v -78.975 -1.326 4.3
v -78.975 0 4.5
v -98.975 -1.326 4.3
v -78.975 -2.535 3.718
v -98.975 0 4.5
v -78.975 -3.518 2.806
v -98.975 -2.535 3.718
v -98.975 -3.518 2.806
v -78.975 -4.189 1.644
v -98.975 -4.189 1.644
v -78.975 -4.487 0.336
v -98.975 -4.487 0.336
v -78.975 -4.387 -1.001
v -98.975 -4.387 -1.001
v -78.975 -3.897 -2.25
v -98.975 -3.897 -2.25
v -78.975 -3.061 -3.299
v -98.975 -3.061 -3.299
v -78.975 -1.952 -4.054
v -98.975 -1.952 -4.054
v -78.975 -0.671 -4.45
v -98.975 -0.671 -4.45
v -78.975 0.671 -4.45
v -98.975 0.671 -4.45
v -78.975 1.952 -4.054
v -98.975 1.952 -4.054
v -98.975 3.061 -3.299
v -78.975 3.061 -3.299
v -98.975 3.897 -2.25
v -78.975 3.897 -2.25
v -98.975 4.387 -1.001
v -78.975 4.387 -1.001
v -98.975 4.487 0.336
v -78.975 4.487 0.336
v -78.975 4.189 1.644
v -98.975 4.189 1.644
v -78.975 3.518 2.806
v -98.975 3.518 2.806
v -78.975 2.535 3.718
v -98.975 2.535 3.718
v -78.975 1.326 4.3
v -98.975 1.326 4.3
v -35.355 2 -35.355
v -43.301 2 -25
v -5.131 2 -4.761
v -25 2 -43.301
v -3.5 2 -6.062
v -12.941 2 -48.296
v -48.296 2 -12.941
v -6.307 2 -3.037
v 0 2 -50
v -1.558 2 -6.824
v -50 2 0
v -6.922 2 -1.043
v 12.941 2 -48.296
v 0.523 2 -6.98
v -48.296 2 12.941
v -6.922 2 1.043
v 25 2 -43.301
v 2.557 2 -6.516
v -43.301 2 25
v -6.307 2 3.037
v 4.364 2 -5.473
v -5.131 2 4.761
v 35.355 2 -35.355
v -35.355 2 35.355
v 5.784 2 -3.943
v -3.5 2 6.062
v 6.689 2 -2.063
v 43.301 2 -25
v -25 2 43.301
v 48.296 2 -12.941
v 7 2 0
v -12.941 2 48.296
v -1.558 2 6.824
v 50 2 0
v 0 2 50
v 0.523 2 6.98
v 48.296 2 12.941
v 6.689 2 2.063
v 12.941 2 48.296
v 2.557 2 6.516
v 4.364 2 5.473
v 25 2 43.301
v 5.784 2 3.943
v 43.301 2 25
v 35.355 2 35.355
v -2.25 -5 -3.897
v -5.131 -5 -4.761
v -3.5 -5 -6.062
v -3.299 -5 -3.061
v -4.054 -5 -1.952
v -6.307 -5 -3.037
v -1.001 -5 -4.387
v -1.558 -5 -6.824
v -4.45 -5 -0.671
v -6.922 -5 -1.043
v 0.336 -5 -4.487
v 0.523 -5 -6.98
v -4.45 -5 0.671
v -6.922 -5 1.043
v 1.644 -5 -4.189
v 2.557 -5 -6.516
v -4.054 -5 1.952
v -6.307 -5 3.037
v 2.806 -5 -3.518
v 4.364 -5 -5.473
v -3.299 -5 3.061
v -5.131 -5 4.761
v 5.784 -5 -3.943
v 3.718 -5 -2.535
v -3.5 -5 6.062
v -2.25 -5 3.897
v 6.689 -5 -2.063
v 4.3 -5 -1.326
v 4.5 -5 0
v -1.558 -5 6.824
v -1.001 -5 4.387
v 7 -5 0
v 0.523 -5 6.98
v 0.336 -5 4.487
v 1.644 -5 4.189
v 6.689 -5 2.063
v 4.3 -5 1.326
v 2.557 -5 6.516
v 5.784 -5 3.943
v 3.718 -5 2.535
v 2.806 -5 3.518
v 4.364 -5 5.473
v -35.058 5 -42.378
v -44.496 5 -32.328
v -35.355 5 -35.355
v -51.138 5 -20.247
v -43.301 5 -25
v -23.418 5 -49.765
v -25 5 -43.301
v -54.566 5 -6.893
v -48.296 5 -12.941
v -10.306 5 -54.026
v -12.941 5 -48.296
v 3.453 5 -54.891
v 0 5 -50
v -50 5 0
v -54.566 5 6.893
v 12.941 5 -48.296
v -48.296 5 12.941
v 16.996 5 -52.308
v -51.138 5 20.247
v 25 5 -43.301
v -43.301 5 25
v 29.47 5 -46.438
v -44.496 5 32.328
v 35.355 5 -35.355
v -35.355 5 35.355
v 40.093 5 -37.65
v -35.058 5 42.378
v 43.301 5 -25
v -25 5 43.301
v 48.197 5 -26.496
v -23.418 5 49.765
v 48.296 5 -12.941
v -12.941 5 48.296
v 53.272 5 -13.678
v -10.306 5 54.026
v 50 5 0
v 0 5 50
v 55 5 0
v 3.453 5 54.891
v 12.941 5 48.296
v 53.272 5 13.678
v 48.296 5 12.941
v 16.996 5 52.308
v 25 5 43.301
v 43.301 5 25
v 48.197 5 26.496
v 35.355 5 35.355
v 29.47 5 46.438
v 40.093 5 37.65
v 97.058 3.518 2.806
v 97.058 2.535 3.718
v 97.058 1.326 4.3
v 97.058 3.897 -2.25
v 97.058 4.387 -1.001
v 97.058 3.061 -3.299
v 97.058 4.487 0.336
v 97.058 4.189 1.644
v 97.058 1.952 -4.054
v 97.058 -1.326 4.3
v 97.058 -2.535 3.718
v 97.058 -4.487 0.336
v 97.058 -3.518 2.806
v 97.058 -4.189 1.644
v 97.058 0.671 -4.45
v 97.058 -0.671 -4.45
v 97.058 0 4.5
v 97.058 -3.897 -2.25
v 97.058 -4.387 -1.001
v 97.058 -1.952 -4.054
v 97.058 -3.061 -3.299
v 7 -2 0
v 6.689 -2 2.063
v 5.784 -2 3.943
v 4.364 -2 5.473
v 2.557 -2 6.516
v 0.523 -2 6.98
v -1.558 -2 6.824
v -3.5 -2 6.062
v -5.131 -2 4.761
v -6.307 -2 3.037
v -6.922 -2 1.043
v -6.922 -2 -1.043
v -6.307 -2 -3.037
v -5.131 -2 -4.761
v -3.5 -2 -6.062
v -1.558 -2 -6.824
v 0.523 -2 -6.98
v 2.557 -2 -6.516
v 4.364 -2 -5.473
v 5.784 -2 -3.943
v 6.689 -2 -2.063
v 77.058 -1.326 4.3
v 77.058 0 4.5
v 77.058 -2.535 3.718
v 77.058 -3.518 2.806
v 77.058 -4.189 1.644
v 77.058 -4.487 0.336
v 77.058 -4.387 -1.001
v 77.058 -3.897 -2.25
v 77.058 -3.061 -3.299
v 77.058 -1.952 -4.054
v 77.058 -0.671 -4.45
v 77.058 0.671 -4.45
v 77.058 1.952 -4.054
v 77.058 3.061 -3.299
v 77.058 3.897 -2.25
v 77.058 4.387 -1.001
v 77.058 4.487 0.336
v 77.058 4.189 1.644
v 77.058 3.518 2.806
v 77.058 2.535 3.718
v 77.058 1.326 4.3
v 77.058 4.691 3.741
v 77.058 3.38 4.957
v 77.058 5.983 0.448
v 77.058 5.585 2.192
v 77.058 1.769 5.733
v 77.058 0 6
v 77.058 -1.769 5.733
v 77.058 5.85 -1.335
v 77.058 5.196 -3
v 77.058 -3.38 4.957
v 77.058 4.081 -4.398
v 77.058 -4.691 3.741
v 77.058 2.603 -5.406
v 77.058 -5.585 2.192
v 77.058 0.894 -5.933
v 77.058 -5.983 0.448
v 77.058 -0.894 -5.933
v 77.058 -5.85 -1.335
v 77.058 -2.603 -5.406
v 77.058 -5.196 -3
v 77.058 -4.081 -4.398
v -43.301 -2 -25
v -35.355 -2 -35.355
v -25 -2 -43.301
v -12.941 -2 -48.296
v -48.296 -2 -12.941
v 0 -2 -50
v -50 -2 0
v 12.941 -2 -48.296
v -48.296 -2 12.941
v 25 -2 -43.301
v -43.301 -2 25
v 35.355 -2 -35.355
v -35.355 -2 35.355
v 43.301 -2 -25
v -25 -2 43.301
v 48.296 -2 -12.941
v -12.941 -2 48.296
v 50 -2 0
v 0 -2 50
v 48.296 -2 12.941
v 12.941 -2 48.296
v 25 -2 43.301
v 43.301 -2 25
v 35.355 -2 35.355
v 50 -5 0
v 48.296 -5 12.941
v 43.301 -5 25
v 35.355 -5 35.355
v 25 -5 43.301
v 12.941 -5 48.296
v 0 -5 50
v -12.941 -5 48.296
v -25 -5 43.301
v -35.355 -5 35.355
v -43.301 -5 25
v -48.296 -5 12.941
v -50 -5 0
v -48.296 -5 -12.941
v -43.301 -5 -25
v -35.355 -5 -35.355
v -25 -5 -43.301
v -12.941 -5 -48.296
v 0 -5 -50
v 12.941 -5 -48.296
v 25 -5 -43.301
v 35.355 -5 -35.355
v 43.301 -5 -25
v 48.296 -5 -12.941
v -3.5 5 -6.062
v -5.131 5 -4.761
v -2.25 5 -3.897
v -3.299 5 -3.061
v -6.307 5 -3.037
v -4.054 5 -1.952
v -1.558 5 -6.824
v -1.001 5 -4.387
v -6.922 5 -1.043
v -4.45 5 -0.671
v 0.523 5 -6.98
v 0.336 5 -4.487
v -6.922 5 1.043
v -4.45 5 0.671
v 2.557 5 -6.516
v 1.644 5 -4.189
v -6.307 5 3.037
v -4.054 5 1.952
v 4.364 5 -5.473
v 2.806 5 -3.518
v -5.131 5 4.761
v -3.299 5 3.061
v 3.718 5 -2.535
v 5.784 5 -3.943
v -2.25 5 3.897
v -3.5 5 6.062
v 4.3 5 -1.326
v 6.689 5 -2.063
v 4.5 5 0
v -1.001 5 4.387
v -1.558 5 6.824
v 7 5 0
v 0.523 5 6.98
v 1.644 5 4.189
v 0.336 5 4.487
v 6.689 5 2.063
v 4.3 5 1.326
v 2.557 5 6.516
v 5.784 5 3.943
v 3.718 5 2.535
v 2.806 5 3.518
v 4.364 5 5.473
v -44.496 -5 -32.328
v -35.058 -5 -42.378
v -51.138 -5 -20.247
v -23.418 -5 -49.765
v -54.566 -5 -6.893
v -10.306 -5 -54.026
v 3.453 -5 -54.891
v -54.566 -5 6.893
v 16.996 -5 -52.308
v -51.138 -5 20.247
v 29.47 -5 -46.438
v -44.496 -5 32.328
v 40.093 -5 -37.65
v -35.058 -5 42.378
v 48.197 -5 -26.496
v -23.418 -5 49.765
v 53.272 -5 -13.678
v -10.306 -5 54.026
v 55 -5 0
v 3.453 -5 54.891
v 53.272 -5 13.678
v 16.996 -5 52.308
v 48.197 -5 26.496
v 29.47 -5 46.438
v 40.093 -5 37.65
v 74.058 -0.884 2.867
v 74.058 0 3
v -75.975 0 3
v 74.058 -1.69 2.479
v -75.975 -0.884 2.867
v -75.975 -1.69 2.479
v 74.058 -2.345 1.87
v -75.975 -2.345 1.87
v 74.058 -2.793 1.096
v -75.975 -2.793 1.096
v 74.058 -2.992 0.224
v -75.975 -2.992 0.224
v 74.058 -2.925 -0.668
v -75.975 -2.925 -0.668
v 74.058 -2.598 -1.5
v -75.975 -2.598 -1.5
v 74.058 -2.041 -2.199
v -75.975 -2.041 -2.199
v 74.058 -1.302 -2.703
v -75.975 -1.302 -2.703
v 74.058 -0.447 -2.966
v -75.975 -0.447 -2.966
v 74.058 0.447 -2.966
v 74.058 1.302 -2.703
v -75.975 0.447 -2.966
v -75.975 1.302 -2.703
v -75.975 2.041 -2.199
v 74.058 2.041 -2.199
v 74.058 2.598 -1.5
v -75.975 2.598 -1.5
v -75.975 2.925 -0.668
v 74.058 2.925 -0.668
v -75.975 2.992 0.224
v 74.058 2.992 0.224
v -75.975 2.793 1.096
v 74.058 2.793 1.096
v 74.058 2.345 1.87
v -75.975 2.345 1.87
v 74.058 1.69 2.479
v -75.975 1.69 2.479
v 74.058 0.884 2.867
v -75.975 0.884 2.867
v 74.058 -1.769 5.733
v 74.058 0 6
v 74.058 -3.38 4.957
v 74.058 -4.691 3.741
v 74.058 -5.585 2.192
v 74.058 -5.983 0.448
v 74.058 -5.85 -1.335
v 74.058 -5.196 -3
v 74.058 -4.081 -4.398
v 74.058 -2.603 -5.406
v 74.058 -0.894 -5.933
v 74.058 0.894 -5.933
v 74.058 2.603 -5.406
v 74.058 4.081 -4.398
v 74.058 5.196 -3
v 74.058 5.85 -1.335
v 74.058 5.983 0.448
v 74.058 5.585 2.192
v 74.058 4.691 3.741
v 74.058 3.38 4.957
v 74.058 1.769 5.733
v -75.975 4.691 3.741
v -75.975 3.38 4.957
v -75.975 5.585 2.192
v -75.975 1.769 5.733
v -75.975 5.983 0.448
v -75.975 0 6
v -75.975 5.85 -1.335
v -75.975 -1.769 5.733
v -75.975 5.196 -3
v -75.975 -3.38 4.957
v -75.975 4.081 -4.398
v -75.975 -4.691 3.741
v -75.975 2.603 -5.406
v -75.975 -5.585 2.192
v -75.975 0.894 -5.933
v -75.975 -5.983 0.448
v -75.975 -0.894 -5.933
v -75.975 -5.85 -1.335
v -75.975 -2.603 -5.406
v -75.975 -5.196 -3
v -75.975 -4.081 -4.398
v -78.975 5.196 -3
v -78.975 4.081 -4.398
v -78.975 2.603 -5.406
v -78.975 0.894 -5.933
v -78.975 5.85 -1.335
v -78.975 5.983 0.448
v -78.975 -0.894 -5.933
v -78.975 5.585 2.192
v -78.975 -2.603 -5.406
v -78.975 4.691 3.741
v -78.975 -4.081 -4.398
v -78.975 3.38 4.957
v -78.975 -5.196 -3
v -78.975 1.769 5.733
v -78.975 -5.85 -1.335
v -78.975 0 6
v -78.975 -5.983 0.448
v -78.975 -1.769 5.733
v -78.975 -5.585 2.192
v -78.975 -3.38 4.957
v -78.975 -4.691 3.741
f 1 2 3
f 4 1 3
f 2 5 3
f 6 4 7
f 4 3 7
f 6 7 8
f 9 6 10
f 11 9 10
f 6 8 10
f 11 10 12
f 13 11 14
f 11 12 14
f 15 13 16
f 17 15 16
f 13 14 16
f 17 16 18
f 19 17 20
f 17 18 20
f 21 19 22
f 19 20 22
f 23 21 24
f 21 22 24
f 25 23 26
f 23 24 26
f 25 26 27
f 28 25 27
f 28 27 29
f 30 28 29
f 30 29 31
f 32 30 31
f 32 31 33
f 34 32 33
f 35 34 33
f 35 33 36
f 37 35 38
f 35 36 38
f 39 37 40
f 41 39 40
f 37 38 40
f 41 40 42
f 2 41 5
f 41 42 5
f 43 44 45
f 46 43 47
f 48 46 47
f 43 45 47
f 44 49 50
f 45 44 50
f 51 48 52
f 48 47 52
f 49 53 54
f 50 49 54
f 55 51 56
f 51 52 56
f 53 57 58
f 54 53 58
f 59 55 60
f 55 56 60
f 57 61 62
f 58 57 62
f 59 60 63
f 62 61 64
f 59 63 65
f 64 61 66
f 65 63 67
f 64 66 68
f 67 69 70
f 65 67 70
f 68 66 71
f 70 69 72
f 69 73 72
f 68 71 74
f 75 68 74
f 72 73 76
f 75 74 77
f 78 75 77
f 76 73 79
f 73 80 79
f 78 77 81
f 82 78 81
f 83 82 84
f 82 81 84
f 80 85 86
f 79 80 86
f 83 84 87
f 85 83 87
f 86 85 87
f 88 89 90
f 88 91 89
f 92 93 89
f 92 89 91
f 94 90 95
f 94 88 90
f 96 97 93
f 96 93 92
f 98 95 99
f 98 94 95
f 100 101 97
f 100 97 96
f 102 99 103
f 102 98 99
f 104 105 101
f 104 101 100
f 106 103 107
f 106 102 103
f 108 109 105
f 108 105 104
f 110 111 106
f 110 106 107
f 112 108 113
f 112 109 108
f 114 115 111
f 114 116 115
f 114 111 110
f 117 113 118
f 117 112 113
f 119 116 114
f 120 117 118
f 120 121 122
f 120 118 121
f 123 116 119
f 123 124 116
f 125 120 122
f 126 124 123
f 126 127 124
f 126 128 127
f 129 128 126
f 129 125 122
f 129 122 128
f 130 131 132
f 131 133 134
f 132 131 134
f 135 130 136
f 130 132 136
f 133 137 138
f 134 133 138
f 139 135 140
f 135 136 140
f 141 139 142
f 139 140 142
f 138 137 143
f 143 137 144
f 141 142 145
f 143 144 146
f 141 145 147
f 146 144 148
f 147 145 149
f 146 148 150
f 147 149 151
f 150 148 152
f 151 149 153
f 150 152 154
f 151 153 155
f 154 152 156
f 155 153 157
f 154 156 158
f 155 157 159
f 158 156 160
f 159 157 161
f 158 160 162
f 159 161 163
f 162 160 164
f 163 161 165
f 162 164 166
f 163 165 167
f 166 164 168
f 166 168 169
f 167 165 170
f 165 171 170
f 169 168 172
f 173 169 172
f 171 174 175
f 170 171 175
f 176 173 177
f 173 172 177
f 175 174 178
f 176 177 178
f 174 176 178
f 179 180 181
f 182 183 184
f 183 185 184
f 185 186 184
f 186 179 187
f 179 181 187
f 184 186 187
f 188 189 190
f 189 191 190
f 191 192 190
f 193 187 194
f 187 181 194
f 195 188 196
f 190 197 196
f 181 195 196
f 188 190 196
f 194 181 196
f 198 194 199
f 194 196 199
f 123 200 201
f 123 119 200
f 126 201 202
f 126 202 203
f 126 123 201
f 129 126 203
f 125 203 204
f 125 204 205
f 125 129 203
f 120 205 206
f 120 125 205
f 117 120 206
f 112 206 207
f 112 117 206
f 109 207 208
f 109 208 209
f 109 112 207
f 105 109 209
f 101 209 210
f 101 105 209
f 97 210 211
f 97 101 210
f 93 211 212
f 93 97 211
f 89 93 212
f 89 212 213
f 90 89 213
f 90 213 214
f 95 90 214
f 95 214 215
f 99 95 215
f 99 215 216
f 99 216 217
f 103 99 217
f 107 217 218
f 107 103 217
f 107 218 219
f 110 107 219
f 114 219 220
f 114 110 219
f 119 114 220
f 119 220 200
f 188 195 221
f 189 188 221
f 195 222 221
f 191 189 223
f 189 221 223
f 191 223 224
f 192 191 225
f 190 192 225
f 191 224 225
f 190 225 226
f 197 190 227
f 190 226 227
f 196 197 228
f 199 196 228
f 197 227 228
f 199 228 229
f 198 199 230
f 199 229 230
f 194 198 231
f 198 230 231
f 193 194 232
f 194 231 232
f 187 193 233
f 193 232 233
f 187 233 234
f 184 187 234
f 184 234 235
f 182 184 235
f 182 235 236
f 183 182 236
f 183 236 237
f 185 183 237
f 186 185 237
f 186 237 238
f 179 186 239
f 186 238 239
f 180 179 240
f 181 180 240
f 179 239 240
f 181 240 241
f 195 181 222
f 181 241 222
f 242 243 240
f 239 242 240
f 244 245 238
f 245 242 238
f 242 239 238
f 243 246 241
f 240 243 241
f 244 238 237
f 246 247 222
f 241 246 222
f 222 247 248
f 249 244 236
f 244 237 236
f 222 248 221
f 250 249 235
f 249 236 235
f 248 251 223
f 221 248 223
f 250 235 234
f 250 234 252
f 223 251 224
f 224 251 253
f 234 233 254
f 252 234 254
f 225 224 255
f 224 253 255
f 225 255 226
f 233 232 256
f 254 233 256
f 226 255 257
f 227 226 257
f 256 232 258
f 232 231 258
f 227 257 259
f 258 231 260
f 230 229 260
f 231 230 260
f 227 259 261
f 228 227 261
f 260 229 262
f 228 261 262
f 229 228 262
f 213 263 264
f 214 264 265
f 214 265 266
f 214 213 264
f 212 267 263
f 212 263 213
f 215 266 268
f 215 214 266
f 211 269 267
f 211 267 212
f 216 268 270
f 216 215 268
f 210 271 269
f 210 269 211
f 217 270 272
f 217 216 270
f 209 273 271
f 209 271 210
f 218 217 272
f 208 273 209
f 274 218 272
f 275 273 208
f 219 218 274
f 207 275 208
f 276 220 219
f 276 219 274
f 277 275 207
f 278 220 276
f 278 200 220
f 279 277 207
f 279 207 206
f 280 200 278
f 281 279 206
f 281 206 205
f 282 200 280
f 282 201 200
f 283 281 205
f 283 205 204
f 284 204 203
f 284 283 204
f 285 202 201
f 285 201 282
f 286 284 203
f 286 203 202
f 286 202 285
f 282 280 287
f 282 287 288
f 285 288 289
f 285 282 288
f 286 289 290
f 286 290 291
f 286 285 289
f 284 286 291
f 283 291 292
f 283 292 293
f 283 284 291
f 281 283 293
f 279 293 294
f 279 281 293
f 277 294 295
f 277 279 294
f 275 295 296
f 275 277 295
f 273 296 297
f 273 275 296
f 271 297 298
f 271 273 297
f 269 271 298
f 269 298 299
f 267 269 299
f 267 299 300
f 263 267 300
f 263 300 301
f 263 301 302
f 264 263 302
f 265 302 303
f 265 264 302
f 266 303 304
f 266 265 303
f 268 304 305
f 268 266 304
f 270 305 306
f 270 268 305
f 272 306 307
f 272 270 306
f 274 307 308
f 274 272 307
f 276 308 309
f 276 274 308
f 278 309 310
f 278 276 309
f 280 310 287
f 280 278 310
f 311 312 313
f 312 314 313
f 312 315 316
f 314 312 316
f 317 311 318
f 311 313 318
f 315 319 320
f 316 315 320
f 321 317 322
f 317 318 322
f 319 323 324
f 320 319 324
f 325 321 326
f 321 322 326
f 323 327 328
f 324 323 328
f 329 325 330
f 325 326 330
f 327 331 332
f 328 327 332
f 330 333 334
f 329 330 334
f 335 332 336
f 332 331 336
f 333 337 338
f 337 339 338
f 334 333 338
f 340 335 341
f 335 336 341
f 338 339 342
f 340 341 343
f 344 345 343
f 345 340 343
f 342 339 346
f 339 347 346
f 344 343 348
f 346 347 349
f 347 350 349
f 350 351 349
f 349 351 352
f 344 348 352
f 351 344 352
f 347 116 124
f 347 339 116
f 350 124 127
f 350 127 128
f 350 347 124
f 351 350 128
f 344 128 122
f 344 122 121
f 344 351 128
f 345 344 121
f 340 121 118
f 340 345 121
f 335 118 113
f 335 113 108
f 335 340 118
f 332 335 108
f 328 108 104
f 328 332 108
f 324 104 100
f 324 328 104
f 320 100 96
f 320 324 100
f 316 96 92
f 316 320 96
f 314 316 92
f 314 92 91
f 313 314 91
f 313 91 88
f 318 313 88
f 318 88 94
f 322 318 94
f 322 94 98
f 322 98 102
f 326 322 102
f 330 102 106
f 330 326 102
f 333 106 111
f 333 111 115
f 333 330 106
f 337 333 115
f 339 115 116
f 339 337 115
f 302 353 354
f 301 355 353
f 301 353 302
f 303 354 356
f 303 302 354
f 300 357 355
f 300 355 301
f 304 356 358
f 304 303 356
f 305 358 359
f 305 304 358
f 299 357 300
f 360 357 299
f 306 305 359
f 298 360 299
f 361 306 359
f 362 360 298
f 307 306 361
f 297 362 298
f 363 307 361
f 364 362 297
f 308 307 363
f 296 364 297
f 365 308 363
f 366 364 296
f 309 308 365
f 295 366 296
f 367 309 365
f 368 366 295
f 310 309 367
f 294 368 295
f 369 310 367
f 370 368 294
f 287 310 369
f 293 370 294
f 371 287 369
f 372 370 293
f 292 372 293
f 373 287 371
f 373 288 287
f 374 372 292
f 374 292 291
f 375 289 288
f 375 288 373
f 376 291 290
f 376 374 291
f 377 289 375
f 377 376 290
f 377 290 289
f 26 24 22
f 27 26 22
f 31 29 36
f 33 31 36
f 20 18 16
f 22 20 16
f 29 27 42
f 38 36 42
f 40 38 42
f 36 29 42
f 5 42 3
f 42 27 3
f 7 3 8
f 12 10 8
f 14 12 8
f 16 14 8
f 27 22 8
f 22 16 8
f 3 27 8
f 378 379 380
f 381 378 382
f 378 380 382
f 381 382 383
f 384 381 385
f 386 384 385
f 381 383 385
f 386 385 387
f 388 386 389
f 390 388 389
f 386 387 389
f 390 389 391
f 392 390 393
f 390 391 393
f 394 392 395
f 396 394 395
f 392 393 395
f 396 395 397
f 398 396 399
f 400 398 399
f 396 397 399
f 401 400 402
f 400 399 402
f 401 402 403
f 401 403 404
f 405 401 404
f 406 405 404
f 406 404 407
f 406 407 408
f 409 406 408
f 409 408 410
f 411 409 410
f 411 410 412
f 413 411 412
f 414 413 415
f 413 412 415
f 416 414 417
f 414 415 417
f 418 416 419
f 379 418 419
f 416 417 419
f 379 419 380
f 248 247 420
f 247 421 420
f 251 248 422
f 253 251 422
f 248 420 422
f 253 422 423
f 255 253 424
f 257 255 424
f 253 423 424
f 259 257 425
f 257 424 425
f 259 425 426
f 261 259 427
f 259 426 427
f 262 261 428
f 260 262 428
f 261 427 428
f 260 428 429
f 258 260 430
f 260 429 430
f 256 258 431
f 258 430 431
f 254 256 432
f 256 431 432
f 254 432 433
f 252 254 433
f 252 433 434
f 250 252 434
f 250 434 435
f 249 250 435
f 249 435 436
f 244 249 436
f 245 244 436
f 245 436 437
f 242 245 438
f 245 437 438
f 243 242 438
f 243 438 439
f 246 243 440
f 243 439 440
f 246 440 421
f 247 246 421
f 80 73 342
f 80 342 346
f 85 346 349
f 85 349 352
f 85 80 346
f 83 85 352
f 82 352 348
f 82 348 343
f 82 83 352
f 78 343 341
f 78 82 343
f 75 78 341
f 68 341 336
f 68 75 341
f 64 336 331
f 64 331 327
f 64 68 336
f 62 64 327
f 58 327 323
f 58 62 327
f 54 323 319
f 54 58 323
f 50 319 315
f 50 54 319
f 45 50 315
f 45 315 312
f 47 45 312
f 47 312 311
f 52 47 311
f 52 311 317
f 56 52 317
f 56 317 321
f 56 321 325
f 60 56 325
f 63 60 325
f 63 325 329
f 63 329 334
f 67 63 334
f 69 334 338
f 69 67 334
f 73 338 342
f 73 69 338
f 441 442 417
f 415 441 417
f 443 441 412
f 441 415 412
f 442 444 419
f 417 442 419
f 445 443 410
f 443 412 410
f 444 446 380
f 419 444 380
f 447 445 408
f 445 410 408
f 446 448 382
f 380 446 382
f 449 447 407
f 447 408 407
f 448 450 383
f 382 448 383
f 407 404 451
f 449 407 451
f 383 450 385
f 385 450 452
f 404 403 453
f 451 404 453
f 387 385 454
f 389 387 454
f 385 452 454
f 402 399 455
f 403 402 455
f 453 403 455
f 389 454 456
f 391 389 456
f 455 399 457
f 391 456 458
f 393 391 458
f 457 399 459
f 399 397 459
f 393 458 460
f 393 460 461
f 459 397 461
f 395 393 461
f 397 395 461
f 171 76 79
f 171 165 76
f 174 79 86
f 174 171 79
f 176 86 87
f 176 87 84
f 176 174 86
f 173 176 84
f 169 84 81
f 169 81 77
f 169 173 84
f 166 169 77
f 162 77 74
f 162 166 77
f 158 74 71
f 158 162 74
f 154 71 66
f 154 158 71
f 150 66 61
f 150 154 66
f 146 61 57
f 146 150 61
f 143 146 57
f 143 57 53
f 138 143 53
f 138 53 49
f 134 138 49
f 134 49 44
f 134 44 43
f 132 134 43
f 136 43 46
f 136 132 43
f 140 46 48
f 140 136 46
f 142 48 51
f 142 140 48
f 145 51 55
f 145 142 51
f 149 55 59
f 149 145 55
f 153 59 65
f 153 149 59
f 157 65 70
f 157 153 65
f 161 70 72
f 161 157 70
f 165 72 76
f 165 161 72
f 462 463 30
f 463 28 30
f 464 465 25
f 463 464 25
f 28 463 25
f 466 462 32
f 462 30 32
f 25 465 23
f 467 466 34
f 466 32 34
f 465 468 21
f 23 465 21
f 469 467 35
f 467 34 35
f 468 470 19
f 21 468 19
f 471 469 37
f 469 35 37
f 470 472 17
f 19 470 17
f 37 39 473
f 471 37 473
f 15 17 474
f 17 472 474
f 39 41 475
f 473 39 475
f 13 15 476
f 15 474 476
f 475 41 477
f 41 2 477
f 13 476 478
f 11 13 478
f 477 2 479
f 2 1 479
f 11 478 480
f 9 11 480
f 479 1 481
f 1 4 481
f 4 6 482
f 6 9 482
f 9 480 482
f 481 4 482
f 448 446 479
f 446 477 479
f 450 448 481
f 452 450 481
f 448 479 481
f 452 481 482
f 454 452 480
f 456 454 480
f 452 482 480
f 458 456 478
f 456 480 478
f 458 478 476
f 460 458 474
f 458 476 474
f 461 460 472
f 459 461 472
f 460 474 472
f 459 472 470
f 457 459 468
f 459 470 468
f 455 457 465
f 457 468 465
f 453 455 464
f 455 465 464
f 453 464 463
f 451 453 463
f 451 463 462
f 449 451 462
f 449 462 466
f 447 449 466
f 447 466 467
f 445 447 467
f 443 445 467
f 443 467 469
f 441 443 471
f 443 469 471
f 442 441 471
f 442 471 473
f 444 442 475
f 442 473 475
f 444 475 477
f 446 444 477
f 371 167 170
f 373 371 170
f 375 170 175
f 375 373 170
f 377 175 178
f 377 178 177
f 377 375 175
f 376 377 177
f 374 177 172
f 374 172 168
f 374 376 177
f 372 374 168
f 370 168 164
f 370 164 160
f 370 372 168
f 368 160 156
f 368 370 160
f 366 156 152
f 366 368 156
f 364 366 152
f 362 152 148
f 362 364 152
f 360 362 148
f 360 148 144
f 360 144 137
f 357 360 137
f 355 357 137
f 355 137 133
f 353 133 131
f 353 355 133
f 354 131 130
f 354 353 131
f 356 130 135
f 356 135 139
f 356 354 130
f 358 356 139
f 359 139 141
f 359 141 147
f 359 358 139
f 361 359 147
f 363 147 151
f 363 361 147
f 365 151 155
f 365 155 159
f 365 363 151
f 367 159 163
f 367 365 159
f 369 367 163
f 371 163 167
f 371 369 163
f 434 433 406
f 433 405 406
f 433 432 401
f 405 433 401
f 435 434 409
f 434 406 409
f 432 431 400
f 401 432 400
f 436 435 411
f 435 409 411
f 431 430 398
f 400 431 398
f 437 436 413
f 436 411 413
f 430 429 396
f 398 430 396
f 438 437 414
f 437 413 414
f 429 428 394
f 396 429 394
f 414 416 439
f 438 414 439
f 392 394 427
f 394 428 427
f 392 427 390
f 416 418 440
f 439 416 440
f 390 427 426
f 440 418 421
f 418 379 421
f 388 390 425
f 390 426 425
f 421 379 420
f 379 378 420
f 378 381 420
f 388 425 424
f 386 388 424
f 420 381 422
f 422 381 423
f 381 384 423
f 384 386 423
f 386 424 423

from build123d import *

# Parameters (mm, degrees)
F0_R     = 50
F0_R_2   = 7
F1_DEPTH = 2
F0_R_3   = 55
F2_DEPTH = 5
F0_R_4   = 4.5
F5_DEPTH = 5


with BuildPart() as f1:
    # F0 (on Front) → F1 (new body, symmetric)
    with BuildSketch(Plane.XZ):
        Circle(F0_R)
        Circle(F0_R_2, mode=Mode.SUBTRACT)
    extrude(amount=F1_DEPTH, both=True)

    # F0 (on Front) → F2 (join, symmetric)
    with BuildSketch(Plane.XZ):
        Circle(F0_R_3)
        Circle(F0_R, mode=Mode.SUBTRACT)
    extrude(amount=F2_DEPTH, both=True)

    # F0 (on Front) → F5 (join, symmetric)
    with BuildSketch(Plane.XZ):
        Circle(F0_R_2)
        Circle(F0_R_4, mode=Mode.SUBTRACT)
    extrude(amount=F5_DEPTH, both=True)


with BuildPart() as f4:
    # F3 (on Front) → F4 (revolve)
    with BuildSketch(Plane.XZ):
        Polygon((-98.9746183659, 0), (97.0577100897, 0), (97.0577100897, 4.5), (77.0577100897, 4.5), (77.0577100897, 6), (74.0577100897, 6), (74.0577100897, 3), (-75.9746183659, 3), (-75.9746183659, 6), (-78.9746183659, 6), (-78.9746183659, 4.5), (-98.9746183659, 4.5), align=None)
    revolve(axis=Axis((-0.9584541381, 0, 0), (1, 0, 0)))


solid = Compound([f1.part, f4.part])
